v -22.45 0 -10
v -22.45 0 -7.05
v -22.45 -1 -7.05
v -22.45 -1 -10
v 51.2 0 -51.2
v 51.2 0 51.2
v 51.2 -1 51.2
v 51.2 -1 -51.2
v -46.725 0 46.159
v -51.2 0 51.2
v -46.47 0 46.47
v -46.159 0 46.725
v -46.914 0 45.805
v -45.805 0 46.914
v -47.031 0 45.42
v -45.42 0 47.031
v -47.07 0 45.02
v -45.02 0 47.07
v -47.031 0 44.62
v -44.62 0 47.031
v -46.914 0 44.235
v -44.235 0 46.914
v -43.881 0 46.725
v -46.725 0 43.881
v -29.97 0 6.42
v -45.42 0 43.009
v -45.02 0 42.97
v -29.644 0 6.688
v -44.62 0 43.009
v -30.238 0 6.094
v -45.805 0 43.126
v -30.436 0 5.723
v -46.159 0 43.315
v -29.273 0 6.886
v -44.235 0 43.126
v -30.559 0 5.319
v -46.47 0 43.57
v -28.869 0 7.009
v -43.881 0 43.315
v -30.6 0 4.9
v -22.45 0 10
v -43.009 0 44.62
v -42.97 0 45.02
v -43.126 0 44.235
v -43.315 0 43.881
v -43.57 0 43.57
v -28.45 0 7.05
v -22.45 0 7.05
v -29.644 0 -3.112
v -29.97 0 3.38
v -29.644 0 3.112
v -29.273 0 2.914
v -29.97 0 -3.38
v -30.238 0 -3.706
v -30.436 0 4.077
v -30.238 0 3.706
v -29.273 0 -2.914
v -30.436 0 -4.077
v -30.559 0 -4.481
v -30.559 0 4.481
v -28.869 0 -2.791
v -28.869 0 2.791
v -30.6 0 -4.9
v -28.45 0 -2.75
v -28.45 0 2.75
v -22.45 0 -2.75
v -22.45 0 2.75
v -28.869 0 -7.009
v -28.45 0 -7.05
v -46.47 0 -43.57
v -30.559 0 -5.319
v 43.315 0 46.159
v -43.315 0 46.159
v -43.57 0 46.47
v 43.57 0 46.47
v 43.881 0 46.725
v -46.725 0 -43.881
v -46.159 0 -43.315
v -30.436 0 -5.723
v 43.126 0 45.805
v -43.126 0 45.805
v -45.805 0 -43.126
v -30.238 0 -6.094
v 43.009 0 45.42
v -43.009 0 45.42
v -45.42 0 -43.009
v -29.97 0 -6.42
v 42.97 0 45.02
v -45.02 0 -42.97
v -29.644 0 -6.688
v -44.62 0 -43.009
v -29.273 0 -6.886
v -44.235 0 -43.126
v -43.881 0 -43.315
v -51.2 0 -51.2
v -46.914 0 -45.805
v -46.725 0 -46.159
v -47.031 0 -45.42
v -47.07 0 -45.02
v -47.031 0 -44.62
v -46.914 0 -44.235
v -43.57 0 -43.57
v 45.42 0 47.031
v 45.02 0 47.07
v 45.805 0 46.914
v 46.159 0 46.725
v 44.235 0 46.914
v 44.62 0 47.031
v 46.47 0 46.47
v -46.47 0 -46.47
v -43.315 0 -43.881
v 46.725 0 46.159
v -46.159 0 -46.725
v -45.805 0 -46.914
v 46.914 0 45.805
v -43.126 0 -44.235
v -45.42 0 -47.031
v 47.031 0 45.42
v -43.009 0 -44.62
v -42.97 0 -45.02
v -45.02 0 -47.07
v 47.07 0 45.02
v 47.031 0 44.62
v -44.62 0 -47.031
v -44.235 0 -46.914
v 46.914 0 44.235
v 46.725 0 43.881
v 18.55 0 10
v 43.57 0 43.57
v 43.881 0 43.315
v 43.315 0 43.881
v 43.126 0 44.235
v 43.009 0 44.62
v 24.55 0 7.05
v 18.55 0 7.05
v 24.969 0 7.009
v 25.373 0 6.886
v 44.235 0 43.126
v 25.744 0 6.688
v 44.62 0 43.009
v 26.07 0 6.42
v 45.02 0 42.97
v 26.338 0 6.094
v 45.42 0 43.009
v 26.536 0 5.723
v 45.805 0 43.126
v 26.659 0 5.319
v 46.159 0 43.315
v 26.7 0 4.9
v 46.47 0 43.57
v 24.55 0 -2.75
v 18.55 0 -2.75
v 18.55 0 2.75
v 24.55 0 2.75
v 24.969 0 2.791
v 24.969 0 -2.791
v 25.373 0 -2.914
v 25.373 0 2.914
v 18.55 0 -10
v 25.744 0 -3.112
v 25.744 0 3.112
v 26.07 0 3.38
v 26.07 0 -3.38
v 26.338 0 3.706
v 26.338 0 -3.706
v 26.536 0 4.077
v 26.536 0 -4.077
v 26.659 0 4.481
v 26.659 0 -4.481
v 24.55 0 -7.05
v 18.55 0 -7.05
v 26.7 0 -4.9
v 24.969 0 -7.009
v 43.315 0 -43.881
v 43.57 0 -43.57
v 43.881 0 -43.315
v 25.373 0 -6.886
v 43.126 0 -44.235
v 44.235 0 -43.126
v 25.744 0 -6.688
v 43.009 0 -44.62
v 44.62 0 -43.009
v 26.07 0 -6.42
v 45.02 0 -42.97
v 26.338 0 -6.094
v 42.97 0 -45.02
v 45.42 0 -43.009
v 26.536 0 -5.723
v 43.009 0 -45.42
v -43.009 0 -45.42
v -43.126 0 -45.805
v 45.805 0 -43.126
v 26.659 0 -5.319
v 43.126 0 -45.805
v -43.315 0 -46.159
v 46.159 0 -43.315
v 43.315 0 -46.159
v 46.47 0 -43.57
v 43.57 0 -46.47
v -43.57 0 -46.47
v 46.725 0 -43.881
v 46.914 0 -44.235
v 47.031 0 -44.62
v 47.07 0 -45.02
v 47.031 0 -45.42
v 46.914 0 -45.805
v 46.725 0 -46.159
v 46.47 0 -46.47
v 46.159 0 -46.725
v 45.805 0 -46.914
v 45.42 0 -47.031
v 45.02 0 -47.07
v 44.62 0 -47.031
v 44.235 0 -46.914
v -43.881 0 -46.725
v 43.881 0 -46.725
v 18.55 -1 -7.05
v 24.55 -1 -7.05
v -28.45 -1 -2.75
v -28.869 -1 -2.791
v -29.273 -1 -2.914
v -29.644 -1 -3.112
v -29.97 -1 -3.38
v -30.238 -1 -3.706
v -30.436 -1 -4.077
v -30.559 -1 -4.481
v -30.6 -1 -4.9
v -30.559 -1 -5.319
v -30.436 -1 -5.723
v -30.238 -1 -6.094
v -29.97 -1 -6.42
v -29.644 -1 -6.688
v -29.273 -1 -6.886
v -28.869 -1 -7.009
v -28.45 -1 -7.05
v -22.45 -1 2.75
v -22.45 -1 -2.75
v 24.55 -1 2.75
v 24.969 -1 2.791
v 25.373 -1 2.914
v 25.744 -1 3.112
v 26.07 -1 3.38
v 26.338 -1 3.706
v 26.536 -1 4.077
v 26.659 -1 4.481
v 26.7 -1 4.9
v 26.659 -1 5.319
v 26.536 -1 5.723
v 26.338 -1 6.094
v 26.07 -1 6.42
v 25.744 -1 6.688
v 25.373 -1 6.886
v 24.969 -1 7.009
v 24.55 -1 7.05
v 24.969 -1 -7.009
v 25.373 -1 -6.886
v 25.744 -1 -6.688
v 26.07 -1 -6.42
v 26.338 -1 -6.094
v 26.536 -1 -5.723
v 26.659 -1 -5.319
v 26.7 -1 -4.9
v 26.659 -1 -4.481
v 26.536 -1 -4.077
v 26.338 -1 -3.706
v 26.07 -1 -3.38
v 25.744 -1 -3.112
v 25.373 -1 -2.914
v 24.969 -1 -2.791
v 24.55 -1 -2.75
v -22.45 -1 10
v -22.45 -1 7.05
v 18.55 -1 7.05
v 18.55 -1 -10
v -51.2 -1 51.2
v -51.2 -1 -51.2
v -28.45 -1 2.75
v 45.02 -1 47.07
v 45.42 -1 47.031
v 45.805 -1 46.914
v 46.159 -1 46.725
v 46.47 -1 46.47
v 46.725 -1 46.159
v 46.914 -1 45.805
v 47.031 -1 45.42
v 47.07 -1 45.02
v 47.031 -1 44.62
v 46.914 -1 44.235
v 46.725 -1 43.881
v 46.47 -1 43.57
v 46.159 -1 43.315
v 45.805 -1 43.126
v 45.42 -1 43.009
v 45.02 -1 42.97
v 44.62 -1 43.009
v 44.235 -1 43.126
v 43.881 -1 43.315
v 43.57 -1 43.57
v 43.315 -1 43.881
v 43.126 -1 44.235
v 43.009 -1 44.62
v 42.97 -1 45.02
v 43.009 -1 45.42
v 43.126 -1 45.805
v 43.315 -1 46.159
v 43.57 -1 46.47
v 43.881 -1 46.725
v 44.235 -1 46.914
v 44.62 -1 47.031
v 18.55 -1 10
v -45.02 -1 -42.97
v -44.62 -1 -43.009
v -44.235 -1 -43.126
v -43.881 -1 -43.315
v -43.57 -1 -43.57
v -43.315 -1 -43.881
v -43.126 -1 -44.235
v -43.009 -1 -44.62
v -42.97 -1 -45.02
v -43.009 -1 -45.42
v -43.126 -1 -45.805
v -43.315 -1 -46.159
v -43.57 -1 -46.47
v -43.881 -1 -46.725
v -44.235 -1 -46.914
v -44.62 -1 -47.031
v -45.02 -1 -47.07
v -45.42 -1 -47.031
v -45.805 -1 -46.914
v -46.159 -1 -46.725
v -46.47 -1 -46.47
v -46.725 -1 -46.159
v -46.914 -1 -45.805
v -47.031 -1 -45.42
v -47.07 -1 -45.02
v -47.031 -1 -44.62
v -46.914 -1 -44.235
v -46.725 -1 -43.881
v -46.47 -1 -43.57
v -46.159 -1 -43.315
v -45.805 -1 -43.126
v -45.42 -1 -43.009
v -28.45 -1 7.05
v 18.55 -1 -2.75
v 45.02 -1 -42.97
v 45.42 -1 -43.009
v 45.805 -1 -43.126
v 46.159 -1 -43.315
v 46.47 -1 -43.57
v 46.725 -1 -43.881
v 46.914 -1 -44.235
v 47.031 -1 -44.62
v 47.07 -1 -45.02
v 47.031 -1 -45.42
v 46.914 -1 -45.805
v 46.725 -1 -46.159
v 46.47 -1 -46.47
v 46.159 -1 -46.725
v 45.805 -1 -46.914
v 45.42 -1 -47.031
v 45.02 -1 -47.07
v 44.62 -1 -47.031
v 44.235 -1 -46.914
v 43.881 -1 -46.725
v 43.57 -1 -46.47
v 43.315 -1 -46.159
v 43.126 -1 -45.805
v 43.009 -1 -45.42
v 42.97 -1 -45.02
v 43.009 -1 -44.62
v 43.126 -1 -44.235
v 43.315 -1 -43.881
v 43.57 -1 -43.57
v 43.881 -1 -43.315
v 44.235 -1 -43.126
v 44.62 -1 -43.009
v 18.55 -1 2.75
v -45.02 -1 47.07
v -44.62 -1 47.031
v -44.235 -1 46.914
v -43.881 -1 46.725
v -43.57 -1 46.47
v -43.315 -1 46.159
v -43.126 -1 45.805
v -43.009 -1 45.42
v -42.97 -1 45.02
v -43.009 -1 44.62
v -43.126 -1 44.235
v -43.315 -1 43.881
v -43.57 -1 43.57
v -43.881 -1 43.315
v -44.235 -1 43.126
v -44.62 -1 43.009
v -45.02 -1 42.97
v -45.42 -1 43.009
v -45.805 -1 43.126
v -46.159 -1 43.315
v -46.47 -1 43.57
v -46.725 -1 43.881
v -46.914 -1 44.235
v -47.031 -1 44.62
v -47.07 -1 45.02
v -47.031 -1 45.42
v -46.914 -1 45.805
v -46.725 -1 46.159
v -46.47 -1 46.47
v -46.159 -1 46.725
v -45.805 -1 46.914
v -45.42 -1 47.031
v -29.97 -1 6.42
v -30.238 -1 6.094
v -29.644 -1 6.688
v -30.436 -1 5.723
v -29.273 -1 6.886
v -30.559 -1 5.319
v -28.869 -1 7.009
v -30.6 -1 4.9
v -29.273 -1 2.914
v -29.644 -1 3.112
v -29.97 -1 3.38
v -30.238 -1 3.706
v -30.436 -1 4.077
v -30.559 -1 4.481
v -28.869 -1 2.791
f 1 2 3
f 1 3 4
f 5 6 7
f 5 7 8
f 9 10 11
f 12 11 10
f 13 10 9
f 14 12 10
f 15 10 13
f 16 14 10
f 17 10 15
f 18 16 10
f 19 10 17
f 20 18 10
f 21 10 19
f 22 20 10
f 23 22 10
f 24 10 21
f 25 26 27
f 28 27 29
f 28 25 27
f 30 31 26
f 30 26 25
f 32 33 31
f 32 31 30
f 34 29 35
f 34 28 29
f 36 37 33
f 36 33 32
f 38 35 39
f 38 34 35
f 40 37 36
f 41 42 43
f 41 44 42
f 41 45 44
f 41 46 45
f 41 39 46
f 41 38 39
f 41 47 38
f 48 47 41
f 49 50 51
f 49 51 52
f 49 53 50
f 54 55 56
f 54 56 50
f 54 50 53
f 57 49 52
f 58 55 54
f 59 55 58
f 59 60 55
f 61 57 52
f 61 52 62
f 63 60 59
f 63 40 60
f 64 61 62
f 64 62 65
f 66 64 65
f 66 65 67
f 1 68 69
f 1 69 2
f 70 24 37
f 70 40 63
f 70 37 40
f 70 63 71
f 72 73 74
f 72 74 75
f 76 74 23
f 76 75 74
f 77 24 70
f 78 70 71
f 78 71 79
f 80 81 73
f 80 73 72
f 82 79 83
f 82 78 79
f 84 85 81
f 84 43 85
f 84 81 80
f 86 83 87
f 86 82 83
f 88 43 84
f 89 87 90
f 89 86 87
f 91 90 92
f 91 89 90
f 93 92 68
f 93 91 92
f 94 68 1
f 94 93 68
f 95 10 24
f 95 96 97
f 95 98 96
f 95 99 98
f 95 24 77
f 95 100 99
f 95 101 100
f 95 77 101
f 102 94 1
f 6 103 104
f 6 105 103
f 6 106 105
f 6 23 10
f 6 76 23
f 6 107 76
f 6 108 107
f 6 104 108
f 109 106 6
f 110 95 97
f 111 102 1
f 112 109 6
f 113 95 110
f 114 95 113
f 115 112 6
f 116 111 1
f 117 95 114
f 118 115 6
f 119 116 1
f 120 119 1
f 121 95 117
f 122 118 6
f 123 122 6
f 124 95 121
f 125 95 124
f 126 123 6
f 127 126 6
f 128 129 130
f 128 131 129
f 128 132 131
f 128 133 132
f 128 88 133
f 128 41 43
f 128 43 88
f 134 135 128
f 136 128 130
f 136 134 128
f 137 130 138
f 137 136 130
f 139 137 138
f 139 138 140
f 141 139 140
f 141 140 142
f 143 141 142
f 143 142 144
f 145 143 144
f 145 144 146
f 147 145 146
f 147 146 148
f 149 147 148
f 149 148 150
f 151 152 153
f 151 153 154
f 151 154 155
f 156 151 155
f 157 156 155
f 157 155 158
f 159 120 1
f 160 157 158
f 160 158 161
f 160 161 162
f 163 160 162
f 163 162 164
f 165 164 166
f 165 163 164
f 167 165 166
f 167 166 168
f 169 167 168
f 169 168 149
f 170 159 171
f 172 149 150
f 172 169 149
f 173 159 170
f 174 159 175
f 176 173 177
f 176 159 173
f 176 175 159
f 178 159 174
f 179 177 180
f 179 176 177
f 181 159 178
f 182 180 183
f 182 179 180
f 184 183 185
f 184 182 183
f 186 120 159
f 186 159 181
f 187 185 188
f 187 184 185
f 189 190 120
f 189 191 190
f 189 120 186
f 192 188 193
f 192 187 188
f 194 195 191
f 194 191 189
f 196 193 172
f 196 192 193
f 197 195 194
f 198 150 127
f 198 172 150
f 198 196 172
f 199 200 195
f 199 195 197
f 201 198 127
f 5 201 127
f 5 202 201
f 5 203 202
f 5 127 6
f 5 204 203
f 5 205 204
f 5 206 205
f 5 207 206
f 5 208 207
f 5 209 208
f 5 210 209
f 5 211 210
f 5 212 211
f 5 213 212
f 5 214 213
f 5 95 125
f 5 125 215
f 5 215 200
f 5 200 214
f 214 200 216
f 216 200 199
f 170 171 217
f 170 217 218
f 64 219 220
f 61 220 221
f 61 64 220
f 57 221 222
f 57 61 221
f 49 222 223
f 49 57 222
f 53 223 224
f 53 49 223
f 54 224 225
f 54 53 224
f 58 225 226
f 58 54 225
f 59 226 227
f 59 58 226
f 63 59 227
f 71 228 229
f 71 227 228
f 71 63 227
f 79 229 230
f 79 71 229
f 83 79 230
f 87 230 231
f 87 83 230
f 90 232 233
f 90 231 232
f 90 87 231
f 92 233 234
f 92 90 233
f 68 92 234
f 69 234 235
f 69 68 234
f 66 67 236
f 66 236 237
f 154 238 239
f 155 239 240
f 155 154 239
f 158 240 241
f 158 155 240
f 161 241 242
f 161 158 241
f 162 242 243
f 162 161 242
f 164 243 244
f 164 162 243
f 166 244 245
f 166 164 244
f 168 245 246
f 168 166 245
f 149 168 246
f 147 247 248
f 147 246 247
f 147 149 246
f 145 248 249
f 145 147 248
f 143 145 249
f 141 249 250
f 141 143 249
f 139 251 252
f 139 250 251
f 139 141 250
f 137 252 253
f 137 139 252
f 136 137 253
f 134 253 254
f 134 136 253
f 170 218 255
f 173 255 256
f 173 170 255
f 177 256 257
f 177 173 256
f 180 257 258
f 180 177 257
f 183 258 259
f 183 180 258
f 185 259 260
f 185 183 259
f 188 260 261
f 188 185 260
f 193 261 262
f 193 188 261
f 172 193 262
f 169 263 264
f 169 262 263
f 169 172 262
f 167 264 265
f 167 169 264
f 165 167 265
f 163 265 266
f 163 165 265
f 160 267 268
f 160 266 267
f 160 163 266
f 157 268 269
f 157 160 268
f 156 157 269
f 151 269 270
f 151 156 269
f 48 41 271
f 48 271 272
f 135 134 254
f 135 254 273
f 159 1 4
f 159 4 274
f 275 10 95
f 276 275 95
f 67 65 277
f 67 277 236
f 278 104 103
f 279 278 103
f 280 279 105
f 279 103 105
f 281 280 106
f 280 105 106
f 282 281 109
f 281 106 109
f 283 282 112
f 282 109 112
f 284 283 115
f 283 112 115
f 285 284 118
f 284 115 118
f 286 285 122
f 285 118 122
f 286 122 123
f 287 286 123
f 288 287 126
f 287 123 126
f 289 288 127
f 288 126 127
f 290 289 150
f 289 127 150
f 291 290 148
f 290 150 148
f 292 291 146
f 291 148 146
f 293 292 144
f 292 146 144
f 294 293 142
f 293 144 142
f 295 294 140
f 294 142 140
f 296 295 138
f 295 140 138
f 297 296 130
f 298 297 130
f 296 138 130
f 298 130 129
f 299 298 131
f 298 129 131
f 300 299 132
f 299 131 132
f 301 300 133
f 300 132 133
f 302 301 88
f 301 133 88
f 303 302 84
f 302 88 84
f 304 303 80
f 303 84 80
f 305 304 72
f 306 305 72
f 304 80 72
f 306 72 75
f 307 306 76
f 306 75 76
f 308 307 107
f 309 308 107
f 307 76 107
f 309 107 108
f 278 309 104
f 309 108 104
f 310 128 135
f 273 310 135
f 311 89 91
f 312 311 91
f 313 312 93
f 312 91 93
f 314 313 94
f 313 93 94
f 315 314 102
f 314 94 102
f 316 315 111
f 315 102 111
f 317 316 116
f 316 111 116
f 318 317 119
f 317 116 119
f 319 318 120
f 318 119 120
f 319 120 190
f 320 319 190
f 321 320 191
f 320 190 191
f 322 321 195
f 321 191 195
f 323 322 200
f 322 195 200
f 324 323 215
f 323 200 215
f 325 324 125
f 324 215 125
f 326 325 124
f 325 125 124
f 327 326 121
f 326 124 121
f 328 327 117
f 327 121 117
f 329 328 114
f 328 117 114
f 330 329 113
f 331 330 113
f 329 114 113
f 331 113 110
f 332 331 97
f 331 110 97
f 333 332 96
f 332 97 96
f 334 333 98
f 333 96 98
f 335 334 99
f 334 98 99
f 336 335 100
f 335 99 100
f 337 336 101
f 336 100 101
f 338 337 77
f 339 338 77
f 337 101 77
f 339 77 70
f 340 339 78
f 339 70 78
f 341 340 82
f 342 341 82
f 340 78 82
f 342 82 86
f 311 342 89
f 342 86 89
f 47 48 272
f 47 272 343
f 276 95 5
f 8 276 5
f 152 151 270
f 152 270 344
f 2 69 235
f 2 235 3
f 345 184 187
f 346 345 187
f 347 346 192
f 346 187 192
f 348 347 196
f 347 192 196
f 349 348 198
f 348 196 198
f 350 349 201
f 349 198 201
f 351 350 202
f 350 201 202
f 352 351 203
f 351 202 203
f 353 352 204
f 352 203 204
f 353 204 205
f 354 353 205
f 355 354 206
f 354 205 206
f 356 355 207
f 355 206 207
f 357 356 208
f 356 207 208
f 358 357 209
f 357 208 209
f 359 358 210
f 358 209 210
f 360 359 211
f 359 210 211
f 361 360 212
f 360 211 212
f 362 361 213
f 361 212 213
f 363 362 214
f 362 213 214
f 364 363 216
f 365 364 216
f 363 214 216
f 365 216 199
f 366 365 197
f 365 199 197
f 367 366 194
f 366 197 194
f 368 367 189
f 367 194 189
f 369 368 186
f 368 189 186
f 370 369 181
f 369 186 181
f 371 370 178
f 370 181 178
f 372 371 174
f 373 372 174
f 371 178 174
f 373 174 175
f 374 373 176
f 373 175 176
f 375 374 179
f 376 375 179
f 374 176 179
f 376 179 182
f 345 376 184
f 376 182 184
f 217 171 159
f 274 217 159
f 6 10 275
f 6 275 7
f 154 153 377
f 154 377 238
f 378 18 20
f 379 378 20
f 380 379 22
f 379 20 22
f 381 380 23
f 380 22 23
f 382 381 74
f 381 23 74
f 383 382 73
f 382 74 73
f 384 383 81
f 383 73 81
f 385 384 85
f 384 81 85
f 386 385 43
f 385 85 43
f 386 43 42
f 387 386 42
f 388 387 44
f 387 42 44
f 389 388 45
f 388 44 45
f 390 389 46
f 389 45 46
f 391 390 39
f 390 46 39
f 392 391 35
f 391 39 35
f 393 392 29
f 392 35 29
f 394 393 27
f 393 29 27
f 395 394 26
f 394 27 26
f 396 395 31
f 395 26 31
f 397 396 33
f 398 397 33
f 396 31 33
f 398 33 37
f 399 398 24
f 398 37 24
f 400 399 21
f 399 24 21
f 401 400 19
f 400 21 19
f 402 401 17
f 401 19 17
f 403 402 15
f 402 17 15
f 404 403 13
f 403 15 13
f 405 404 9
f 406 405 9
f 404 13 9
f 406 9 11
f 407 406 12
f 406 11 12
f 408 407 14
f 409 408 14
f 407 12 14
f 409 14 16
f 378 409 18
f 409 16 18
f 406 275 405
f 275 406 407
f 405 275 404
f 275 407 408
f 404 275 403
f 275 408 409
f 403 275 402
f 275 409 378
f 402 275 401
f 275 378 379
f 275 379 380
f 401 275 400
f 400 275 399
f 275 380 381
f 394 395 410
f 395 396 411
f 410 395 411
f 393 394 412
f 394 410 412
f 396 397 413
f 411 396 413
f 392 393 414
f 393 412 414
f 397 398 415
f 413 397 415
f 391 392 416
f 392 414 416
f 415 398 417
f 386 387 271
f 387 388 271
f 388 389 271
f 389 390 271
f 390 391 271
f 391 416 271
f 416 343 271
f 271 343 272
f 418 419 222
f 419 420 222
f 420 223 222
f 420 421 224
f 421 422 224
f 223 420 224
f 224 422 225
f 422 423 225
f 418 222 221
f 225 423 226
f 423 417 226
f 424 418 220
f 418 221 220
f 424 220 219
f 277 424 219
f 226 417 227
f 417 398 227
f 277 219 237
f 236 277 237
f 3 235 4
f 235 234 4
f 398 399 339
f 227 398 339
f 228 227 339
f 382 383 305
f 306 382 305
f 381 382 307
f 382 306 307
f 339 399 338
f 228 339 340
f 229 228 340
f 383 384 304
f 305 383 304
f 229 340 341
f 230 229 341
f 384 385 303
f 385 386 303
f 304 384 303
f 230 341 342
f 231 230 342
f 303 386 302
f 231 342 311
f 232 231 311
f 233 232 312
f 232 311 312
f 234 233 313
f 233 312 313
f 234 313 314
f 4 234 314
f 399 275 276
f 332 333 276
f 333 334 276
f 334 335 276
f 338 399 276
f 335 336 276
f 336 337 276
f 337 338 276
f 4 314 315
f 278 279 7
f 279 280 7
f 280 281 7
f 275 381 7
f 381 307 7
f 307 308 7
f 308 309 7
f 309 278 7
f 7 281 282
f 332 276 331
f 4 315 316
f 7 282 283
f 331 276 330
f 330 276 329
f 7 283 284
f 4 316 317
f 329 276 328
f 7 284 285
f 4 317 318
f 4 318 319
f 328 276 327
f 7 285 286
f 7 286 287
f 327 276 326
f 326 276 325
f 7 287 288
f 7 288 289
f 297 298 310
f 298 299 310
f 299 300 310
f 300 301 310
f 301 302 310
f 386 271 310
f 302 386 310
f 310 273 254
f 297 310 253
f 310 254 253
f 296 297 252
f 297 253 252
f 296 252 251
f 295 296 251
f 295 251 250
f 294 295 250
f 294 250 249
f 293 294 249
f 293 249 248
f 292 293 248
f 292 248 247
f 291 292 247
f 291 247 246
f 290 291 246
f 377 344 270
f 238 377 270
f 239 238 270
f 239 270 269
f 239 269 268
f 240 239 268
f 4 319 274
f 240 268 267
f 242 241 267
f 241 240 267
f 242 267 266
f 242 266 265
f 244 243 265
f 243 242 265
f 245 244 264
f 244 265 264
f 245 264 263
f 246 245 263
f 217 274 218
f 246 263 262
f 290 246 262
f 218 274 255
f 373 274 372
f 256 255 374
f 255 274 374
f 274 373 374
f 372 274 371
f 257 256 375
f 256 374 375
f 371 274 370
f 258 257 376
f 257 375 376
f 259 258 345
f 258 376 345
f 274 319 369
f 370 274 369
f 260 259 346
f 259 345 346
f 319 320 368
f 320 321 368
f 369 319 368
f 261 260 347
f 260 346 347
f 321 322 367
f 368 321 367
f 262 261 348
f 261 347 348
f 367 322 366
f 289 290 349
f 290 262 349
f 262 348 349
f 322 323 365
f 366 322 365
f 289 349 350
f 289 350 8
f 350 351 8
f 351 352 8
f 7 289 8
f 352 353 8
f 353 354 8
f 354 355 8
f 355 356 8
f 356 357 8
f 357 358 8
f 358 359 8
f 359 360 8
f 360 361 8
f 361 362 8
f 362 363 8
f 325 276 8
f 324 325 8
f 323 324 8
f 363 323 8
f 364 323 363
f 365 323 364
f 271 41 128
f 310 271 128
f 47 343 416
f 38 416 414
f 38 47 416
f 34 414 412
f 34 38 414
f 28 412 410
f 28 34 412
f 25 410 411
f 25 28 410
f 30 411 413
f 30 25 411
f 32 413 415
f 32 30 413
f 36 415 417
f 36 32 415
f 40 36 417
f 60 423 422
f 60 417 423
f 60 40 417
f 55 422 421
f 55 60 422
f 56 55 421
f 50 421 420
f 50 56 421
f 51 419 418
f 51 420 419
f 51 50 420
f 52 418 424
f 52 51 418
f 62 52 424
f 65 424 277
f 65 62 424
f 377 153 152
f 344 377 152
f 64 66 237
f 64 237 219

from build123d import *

# Parameters (mm, degrees)
SKETCH1_W          = 102.4
SKETCH1_H          = 102.4
SKETCH1_R          = 2.05
SKETCH1_W_2        = 41
SKETCH1_H_2        = 20
BASE_FLANGE1_DEPTH = 1
CUT_EXTRUDE2_DEPTH = 10


# Sheet-metal steps are written as plain solids
with BuildPart() as part:
    # Sketch1 → Base-Flange1 (new body)
    with BuildSketch(Plane(origin=(0, 0, 0), x_dir=(1, 0, 0), z_dir=(0, 1, 0))):
        Rectangle(SKETCH1_W, SKETCH1_H)
        with Locations(Location((45.02, 45.02, 0), (0, 0, 270))):
            Circle(SKETCH1_R, mode=Mode.SUBTRACT)
        with Locations(Location((45.02, -45.02, 0), (0, 0, 270))):
            Circle(SKETCH1_R, mode=Mode.SUBTRACT)
        with Locations(Location((-45.02, -45.02, 0), (0, 0, 270))):
            Circle(SKETCH1_R, mode=Mode.SUBTRACT)
        with Locations(Location((-45.02, 45.02, 0), (0, 0, 270))):
            Circle(SKETCH1_R, mode=Mode.SUBTRACT)
        with Locations((-1.95, 0)):
            Rectangle(SKETCH1_W_2, SKETCH1_H_2, mode=Mode.SUBTRACT)
    extrude(amount=-BASE_FLANGE1_DEPTH)

    # Sketch7 → Cut-Extrude2 (cut)
    with BuildSketch(Plane(origin=(0, 0, 0), x_dir=(1, 0, 0), z_dir=(0, 1, 0))):
        with BuildLine():
            Line((-28.45, 7.05), (-16.45, 7.05))
            ThreePointArc((-16.45, 7.05), (-14.3, 4.9), (-16.45, 2.75))
            Line((-16.45, 2.75), (-28.45, 2.75))
            ThreePointArc((-28.45, 2.75), (-30.6, 4.9), (-28.45, 7.05))
        make_face()
        with BuildLine():
            Line((-28.45, -2.75), (-16.45, -2.75))
            ThreePointArc((-16.45, -2.75), (-14.3, -4.9), (-16.45, -7.05))
            Line((-16.45, -7.05), (-28.45, -7.05))
            ThreePointArc((-28.45, -7.05), (-30.6, -4.9), (-28.45, -2.75))
        make_face()
        with BuildLine():
            Line((12.55, 7.05), (24.55, 7.05))
            ThreePointArc((24.55, 7.05), (26.7, 4.9), (24.55, 2.75))
            Line((24.55, 2.75), (12.55, 2.75))
            ThreePointArc((12.55, 2.75), (10.4, 4.9), (12.55, 7.05))
        make_face()
        with BuildLine():
            Line((12.55, -2.75), (24.55, -2.75))
            ThreePointArc((24.55, -2.75), (26.7, -4.9), (24.55, -7.05))
            Line((24.55, -7.05), (12.55, -7.05))
            ThreePointArc((12.55, -7.05), (10.4, -4.9), (12.55, -2.75))
        make_face()
    extrude(amount=-CUT_EXTRUDE2_DEPTH, mode=Mode.SUBTRACT)


solid = part.part
